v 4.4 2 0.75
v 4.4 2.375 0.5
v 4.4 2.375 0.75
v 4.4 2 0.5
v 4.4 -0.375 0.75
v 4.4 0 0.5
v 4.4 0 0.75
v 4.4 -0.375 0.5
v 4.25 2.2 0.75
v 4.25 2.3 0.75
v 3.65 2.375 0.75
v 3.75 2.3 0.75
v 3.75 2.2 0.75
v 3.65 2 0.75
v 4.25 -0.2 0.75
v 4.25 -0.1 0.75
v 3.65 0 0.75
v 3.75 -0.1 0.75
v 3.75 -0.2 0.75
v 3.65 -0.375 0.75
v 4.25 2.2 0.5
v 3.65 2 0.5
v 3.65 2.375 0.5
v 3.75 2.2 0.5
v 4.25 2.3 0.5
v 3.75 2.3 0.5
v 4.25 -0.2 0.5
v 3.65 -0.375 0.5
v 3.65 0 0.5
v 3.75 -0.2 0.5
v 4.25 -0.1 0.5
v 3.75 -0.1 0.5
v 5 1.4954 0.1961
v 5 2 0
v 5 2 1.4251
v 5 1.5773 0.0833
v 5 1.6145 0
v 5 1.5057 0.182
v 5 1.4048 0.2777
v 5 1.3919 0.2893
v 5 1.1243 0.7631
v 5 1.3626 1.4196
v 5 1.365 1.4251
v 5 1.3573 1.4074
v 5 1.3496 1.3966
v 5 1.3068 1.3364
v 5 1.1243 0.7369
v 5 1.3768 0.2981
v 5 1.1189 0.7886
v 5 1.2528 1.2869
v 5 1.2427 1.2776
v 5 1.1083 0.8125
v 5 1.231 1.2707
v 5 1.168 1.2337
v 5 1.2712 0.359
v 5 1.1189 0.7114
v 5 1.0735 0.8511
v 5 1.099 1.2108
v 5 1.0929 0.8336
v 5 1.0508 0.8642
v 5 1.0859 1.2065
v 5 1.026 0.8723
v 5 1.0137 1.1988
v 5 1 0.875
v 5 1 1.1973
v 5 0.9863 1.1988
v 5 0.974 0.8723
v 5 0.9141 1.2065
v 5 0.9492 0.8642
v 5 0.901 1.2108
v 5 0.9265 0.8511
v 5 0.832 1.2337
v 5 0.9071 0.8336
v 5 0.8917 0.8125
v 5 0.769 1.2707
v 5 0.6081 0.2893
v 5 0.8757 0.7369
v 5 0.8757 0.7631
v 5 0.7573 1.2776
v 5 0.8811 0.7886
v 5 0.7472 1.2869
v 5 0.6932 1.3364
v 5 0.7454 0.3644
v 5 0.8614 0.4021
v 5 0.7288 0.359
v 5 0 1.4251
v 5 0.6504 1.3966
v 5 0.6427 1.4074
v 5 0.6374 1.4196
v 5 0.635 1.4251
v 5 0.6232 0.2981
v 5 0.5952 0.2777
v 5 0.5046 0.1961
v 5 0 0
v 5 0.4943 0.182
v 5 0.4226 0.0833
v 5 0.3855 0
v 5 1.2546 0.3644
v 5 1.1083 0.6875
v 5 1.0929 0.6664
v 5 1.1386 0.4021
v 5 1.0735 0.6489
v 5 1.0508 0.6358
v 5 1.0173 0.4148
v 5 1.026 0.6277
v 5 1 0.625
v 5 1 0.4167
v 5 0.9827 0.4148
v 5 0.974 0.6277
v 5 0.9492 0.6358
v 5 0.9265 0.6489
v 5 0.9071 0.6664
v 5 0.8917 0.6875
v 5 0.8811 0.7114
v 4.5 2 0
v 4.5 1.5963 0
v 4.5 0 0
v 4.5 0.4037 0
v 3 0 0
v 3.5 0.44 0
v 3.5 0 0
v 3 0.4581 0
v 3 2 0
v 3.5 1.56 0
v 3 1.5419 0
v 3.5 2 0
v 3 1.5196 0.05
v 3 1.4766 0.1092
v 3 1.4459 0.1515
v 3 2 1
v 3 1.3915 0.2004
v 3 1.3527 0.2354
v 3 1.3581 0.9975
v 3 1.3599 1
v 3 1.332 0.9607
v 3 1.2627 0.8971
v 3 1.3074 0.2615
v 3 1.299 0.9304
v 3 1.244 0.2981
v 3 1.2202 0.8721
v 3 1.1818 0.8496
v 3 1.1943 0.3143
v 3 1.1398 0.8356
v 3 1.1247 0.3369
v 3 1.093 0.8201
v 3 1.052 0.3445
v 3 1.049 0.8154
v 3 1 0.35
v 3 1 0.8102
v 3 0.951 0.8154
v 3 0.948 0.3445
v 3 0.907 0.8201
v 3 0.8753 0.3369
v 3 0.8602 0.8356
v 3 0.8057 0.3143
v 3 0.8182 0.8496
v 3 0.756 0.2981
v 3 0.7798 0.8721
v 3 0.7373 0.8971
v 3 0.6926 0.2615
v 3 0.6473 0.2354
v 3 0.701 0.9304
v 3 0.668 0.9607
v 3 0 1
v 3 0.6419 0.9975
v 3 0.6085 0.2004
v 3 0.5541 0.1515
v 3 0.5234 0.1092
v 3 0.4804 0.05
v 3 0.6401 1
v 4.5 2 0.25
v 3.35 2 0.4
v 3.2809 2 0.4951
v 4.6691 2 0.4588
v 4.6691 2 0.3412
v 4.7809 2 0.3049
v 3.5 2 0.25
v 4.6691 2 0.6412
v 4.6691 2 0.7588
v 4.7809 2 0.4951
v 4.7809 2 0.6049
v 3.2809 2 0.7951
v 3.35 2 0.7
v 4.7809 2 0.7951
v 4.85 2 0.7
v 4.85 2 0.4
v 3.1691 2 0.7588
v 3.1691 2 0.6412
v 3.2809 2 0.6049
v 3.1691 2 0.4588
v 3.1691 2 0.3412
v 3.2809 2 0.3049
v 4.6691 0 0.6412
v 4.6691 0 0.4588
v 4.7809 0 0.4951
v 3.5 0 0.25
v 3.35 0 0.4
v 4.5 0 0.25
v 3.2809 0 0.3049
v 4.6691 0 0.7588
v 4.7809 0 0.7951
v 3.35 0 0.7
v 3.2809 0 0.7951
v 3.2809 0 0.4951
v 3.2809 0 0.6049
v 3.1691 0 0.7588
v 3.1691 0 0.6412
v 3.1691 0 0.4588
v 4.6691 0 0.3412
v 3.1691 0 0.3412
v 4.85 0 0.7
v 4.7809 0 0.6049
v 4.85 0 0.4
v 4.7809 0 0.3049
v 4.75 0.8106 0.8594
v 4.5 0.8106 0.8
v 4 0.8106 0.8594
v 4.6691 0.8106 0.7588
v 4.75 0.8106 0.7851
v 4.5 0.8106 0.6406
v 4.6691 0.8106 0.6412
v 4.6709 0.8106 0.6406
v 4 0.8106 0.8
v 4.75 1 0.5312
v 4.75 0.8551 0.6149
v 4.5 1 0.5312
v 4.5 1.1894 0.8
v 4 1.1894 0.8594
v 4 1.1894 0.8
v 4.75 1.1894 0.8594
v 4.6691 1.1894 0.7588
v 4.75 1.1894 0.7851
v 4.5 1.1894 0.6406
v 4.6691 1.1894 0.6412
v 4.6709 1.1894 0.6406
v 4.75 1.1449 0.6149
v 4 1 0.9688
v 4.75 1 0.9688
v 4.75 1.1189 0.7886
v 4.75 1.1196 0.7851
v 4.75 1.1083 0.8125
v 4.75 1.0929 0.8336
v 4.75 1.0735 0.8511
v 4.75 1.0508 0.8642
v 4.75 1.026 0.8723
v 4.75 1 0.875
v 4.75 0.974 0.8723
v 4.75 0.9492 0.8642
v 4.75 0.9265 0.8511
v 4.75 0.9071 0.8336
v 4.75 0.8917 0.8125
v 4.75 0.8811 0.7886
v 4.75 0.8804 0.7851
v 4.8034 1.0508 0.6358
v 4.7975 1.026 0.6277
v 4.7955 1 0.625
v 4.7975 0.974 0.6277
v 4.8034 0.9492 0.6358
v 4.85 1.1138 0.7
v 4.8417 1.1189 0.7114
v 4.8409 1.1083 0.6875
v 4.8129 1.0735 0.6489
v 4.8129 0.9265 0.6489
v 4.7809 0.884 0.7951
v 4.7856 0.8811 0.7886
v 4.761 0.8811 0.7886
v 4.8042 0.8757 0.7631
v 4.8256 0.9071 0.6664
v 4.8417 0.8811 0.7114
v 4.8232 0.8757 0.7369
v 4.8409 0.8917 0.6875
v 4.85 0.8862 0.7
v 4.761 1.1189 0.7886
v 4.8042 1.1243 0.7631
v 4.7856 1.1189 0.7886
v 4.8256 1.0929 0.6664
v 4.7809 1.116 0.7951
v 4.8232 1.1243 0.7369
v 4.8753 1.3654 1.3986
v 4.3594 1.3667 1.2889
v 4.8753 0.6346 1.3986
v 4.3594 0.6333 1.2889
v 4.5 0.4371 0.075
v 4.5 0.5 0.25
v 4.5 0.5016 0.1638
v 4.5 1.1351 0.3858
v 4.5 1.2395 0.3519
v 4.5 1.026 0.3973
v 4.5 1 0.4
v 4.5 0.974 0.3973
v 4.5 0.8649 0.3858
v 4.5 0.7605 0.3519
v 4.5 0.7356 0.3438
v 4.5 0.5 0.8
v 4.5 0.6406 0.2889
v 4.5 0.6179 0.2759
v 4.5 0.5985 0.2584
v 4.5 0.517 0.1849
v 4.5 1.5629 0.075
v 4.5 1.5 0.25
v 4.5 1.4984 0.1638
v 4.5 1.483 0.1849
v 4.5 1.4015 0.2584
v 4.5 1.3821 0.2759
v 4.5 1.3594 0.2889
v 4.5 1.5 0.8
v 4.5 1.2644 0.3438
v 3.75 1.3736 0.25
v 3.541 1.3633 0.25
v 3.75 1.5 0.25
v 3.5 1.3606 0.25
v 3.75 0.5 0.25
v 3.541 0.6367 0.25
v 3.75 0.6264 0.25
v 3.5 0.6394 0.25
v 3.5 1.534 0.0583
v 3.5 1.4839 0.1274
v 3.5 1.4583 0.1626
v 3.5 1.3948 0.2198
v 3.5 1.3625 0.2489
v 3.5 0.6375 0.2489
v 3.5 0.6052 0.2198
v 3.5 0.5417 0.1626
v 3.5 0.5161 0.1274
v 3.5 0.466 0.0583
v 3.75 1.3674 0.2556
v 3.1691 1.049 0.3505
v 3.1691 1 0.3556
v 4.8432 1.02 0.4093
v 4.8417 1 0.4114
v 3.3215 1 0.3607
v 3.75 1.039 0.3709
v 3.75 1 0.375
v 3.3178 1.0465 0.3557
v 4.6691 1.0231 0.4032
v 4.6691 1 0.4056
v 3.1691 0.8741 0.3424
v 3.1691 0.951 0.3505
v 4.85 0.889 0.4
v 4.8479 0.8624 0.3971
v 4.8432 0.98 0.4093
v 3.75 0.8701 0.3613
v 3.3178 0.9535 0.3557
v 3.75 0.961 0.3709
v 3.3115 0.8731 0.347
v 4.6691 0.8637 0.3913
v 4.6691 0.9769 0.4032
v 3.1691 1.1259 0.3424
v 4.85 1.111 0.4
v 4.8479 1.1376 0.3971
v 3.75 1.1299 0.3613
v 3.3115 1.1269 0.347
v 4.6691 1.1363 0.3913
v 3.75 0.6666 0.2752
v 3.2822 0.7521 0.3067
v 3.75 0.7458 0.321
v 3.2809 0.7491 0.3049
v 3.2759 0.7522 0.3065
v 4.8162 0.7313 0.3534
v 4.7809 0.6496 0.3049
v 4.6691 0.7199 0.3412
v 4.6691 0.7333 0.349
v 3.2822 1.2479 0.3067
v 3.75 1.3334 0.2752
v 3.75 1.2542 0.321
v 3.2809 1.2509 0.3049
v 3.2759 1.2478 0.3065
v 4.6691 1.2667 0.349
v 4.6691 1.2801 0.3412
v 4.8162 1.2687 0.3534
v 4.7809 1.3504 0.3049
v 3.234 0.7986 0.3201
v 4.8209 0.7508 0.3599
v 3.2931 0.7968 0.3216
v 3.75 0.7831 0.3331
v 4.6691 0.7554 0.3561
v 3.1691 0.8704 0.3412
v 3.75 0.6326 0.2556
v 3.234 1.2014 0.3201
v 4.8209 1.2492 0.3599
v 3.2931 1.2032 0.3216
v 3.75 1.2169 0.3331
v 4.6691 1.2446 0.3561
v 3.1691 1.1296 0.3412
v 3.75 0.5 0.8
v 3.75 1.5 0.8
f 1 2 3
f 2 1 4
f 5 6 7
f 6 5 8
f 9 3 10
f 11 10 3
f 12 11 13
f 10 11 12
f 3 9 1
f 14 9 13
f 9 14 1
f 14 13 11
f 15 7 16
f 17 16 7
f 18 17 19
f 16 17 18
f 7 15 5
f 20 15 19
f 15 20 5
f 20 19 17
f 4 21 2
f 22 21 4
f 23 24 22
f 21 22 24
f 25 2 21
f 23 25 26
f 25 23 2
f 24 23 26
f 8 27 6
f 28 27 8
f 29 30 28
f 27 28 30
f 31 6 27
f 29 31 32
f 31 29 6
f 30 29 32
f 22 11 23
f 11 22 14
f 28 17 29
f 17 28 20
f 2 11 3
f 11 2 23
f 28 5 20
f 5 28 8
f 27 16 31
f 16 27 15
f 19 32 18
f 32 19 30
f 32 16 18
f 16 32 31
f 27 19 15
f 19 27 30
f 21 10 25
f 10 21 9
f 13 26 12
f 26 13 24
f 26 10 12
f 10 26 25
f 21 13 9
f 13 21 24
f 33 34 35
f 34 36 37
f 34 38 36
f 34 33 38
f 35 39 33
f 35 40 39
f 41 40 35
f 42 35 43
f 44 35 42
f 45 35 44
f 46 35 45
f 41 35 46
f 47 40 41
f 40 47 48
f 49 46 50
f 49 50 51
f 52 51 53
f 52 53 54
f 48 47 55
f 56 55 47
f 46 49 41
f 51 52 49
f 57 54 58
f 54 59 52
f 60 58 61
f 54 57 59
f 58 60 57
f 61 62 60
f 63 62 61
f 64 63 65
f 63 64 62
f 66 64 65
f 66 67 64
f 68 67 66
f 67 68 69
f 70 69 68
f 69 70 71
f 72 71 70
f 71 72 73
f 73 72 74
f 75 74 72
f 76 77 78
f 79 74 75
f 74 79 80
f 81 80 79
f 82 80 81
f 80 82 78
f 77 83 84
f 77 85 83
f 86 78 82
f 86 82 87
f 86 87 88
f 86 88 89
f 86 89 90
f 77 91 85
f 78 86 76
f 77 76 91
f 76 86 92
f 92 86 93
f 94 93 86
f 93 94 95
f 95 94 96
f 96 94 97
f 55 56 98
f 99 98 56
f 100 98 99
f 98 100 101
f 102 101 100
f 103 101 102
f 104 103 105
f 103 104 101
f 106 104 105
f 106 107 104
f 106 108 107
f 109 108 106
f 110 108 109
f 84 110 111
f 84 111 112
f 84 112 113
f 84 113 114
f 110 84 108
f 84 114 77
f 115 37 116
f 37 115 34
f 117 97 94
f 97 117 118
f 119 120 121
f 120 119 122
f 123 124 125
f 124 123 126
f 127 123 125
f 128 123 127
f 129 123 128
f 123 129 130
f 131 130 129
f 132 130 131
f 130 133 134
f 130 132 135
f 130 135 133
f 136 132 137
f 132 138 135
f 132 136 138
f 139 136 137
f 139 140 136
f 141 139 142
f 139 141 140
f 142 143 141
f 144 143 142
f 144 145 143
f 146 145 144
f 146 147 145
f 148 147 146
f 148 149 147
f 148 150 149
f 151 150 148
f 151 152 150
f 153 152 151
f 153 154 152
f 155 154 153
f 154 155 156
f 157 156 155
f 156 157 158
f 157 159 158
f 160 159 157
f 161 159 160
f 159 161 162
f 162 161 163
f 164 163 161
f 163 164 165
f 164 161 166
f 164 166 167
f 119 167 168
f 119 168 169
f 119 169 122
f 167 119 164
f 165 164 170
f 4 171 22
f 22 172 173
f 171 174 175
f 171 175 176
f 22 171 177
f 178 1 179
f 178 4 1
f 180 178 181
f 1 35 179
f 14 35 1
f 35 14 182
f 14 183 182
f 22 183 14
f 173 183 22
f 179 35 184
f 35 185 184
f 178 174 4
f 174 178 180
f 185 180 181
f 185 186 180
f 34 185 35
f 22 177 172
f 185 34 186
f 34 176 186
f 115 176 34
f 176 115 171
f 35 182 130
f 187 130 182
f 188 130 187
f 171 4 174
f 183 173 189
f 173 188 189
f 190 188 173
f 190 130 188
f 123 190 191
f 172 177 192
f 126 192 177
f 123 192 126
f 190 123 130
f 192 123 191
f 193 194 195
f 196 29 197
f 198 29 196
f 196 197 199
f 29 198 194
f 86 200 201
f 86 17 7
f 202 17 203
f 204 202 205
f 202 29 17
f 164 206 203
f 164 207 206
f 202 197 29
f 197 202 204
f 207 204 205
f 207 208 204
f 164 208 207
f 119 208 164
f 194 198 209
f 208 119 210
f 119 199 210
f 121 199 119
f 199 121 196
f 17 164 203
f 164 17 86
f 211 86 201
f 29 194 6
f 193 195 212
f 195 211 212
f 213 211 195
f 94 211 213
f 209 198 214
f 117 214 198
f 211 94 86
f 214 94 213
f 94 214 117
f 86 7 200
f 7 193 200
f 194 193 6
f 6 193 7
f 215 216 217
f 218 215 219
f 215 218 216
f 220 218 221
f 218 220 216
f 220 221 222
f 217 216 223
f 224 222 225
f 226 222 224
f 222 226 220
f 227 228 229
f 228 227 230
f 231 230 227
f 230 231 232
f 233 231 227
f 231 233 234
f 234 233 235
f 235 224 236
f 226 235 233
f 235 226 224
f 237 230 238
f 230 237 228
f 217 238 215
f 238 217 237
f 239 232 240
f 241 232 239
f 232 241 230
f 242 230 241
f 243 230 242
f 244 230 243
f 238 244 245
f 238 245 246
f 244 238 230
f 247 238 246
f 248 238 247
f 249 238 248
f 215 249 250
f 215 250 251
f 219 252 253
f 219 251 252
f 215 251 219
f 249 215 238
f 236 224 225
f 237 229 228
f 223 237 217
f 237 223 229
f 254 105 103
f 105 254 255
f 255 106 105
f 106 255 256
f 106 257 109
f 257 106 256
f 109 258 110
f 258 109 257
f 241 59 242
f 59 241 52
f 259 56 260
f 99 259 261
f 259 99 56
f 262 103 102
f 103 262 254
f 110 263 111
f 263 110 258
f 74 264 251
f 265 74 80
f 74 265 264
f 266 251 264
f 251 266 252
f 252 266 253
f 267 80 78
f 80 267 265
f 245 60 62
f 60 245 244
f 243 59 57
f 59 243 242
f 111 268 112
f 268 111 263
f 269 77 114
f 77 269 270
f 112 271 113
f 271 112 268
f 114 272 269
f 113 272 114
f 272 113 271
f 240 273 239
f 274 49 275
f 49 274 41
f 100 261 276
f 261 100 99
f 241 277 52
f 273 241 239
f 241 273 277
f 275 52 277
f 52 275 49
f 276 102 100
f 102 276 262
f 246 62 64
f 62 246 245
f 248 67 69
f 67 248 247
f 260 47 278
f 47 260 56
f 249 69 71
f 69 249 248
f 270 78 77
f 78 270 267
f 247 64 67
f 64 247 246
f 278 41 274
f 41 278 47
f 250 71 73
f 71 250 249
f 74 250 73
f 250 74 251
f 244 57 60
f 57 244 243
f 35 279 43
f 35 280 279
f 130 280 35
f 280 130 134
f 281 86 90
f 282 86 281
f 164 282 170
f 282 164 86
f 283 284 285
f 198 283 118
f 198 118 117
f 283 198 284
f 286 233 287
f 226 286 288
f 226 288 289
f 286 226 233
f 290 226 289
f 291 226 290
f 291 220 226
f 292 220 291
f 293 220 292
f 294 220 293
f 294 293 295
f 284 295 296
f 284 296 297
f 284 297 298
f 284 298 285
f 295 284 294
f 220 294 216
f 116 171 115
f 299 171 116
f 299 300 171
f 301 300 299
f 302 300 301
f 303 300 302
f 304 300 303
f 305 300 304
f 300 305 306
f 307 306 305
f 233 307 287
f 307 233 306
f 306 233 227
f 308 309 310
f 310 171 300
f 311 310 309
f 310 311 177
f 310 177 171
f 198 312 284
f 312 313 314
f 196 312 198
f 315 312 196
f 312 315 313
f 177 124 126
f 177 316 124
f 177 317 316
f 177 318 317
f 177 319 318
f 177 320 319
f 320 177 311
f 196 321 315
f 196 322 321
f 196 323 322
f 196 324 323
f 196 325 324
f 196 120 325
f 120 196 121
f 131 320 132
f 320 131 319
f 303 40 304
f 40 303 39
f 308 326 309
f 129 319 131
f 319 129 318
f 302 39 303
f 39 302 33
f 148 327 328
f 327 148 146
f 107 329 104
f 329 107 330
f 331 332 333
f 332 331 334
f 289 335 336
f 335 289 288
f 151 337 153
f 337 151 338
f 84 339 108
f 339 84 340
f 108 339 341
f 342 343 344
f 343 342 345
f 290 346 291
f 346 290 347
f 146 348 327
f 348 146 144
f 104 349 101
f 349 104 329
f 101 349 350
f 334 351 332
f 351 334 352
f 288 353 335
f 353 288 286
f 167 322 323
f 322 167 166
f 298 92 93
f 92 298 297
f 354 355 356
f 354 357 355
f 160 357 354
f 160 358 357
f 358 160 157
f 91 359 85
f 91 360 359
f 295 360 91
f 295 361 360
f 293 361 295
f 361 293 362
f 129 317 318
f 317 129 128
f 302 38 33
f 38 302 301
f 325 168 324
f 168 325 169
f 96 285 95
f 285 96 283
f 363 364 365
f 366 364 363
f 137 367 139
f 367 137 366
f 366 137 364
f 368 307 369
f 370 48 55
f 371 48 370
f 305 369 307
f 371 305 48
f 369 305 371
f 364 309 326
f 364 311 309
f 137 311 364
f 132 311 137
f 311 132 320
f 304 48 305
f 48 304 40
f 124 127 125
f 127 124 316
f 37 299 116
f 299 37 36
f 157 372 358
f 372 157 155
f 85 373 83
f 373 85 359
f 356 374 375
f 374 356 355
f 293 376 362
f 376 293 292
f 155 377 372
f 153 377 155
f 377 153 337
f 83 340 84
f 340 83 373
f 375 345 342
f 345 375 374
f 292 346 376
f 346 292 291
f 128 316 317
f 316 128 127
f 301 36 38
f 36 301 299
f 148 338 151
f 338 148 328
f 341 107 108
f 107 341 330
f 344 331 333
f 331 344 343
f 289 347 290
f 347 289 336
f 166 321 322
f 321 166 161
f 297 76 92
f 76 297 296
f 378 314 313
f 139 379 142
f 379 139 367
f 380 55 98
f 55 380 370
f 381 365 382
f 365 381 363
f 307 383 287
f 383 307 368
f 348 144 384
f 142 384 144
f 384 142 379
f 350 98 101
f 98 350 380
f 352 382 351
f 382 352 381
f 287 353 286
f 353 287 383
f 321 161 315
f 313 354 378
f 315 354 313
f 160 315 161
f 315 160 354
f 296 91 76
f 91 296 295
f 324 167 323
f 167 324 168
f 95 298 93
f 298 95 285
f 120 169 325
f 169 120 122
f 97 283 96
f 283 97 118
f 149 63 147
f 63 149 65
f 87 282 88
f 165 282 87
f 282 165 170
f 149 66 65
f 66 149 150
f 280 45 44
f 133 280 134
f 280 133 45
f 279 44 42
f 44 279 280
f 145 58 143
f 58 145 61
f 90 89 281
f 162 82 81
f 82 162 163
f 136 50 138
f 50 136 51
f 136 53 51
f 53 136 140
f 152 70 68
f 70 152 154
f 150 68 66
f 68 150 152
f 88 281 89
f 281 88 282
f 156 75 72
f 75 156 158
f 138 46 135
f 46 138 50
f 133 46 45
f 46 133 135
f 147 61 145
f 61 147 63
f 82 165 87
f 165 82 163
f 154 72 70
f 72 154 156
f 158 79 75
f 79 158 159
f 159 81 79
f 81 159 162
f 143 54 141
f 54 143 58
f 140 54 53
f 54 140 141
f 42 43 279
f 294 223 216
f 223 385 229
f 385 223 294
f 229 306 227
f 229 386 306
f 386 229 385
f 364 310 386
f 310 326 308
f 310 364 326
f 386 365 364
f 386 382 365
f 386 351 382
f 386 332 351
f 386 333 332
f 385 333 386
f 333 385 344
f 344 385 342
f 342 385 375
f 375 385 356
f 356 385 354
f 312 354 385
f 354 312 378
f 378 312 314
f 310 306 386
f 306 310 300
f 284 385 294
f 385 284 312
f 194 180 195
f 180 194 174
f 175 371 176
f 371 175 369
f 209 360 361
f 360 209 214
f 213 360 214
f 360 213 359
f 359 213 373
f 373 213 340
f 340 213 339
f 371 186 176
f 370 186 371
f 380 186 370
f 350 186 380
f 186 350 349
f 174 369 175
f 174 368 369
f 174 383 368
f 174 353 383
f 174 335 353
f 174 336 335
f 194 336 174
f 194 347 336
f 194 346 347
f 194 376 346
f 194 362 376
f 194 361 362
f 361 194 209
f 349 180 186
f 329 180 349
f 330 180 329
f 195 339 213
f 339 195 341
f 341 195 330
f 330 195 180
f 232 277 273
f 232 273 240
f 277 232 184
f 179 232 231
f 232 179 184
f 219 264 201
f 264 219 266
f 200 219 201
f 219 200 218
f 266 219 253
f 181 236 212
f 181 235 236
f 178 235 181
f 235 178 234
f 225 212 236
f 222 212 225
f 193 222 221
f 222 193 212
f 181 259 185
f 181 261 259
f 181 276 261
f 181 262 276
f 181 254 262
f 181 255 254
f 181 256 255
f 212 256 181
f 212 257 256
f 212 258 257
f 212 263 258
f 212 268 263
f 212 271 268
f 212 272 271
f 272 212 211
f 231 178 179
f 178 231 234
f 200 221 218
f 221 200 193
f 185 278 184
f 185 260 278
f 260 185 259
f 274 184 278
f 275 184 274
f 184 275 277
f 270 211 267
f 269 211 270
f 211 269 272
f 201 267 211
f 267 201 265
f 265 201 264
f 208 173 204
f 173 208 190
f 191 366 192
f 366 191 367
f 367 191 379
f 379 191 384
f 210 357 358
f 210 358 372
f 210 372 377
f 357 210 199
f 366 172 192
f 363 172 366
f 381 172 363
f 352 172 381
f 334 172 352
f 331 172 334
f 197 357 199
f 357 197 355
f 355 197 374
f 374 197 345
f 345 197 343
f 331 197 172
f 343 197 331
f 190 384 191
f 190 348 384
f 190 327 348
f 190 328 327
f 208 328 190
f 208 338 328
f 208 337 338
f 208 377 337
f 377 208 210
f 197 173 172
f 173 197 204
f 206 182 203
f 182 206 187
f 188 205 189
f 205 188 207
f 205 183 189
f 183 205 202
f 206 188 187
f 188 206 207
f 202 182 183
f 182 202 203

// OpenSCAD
// Trying to be a trekking pole camera mount
// jellsworth Dec 2014
//
// units = inches



difference() {
	union(){
		// base block
		translate([3, 0, 0]) {
			cube([ 2, 2, 1.5 ], false);
		}

		// add strap supports
		difference() {
			// add strap base
			translate( [3.65, -0.375, 0.5]) {
				cube([ 0.75, 2.75, 0.25]);
			}
			
			// cut strap holes
			translate([3.75, -0.2, 0]){
				cube([0.5, 0.1, 2], false);
			}
			translate([3.75, 2.2, 0]){
				cube([0.5, 0.1, 2], false);
			}
		}
	}



	// remove wedge
	translate([ 3, 0, 1]) {
		rotate([ 0, -12, 0]) {
			cube([ 3, 2, 1 ], false);
		}
	}

	// remove cross-cut
	translate([ 3.5, -0.5, 0]) {
		cube([ 1, 3, 0.25 ], false);
	}


	// remove pole channel 1
	translate([ 0, 1, -0.25]) {
		rotate([ 0, 90, 0]) {
			cylinder(h = 6, r1 = 0.5, r2 = 0.7, center = false, $fn=30);
		}
	}

	// remove pole channel 2
	translate([ -0.2, 1, 0.7]) {
		rotate([ 0, 80, 0]) {
			cylinder(h = 6, r1 = 0.5, r2 = 0.4, center = false, $fn=30);
		}
	}


	//cut hole for bolt
	//1/4" - 20 x 3/4" (w/ 7/16" head)
	translate([4, 1, 0.75]){
		rotate([0, 90, 0]){
			cylinder(h = 0.75, d=7/16, $fn=6);
			cylinder(h = 1.5, d=1/4, $fn=30);
		}
	}

	//cut bolt access
	translate([3.75, 0.5, 0]){
		cube([ 0.75, 1, 0.8]);
	}
	
	//reduce volume
	// upper block - bottom row
	translate([4.75, -0.5, 0.4]){
		vhole();
	}
	// upper block - middle row
	translate([4.75, -0.5, 0.7]){
		vhole();
	}
	// lower block - bottom row
	translate([3.25, -0.5, 0.4]){
		vhole();
	}
	// lower block - middle row
	translate([3.25, -0.5, 0.7]){
		vhole();
	}


}

module vhole() {
		rotate([-90, 0, 0]){
			cylinder(h = 3, d=0.2, $fn=5);
		}
}
